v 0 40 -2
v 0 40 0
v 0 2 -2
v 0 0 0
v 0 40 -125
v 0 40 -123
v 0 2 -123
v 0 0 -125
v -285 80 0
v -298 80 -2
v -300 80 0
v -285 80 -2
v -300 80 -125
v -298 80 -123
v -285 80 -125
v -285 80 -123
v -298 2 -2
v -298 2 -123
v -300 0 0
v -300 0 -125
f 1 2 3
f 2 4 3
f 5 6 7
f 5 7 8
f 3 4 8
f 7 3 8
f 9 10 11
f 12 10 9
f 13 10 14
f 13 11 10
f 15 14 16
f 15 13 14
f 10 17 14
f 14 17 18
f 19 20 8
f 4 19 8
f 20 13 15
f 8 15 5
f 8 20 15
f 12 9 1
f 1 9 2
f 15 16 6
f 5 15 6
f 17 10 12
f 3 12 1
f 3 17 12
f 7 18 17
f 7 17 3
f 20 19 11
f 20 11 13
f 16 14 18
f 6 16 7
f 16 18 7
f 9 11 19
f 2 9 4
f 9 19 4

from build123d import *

# Parameters (mm, degrees)
SKETCH1_W           = 300
SKETCH1_H           = 125
BOSS_EXTRUDE2_DEPTH = 80
CUT_EXTRUDE2_DEPTH  = 135
SHELL2_T            = -2


with BuildPart() as part:
    # Sketch1 → Boss-Extrude2 (new body)
    with BuildSketch(Plane(origin=(0, 0, 0), x_dir=(1, 0, 0), z_dir=(0, 1, 0))):
        with Locations((-150, 62.5)):
            Rectangle(SKETCH1_W, SKETCH1_H)
    extrude(amount=BOSS_EXTRUDE2_DEPTH)

    # Sketch3 → Cut-Extrude2 (cut)
    with BuildSketch(Plane.XY):
        Polygon((0, 80), (-285, 80), (0, 40), align=None)
    extrude(amount=-CUT_EXTRUDE2_DEPTH, mode=Mode.SUBTRACT)

    # Shell2
    shell2_openings = [part.faces().sort_by_distance(p)[0] for p in [
        (-292.5, 80, -62.5),
        (-142.5, 60, -62.5),
        (0, 20, -62.5),
    ]]
    offset(amount=SHELL2_T, openings=shell2_openings, kind=Kind.INTERSECTION)


solid = part.part
